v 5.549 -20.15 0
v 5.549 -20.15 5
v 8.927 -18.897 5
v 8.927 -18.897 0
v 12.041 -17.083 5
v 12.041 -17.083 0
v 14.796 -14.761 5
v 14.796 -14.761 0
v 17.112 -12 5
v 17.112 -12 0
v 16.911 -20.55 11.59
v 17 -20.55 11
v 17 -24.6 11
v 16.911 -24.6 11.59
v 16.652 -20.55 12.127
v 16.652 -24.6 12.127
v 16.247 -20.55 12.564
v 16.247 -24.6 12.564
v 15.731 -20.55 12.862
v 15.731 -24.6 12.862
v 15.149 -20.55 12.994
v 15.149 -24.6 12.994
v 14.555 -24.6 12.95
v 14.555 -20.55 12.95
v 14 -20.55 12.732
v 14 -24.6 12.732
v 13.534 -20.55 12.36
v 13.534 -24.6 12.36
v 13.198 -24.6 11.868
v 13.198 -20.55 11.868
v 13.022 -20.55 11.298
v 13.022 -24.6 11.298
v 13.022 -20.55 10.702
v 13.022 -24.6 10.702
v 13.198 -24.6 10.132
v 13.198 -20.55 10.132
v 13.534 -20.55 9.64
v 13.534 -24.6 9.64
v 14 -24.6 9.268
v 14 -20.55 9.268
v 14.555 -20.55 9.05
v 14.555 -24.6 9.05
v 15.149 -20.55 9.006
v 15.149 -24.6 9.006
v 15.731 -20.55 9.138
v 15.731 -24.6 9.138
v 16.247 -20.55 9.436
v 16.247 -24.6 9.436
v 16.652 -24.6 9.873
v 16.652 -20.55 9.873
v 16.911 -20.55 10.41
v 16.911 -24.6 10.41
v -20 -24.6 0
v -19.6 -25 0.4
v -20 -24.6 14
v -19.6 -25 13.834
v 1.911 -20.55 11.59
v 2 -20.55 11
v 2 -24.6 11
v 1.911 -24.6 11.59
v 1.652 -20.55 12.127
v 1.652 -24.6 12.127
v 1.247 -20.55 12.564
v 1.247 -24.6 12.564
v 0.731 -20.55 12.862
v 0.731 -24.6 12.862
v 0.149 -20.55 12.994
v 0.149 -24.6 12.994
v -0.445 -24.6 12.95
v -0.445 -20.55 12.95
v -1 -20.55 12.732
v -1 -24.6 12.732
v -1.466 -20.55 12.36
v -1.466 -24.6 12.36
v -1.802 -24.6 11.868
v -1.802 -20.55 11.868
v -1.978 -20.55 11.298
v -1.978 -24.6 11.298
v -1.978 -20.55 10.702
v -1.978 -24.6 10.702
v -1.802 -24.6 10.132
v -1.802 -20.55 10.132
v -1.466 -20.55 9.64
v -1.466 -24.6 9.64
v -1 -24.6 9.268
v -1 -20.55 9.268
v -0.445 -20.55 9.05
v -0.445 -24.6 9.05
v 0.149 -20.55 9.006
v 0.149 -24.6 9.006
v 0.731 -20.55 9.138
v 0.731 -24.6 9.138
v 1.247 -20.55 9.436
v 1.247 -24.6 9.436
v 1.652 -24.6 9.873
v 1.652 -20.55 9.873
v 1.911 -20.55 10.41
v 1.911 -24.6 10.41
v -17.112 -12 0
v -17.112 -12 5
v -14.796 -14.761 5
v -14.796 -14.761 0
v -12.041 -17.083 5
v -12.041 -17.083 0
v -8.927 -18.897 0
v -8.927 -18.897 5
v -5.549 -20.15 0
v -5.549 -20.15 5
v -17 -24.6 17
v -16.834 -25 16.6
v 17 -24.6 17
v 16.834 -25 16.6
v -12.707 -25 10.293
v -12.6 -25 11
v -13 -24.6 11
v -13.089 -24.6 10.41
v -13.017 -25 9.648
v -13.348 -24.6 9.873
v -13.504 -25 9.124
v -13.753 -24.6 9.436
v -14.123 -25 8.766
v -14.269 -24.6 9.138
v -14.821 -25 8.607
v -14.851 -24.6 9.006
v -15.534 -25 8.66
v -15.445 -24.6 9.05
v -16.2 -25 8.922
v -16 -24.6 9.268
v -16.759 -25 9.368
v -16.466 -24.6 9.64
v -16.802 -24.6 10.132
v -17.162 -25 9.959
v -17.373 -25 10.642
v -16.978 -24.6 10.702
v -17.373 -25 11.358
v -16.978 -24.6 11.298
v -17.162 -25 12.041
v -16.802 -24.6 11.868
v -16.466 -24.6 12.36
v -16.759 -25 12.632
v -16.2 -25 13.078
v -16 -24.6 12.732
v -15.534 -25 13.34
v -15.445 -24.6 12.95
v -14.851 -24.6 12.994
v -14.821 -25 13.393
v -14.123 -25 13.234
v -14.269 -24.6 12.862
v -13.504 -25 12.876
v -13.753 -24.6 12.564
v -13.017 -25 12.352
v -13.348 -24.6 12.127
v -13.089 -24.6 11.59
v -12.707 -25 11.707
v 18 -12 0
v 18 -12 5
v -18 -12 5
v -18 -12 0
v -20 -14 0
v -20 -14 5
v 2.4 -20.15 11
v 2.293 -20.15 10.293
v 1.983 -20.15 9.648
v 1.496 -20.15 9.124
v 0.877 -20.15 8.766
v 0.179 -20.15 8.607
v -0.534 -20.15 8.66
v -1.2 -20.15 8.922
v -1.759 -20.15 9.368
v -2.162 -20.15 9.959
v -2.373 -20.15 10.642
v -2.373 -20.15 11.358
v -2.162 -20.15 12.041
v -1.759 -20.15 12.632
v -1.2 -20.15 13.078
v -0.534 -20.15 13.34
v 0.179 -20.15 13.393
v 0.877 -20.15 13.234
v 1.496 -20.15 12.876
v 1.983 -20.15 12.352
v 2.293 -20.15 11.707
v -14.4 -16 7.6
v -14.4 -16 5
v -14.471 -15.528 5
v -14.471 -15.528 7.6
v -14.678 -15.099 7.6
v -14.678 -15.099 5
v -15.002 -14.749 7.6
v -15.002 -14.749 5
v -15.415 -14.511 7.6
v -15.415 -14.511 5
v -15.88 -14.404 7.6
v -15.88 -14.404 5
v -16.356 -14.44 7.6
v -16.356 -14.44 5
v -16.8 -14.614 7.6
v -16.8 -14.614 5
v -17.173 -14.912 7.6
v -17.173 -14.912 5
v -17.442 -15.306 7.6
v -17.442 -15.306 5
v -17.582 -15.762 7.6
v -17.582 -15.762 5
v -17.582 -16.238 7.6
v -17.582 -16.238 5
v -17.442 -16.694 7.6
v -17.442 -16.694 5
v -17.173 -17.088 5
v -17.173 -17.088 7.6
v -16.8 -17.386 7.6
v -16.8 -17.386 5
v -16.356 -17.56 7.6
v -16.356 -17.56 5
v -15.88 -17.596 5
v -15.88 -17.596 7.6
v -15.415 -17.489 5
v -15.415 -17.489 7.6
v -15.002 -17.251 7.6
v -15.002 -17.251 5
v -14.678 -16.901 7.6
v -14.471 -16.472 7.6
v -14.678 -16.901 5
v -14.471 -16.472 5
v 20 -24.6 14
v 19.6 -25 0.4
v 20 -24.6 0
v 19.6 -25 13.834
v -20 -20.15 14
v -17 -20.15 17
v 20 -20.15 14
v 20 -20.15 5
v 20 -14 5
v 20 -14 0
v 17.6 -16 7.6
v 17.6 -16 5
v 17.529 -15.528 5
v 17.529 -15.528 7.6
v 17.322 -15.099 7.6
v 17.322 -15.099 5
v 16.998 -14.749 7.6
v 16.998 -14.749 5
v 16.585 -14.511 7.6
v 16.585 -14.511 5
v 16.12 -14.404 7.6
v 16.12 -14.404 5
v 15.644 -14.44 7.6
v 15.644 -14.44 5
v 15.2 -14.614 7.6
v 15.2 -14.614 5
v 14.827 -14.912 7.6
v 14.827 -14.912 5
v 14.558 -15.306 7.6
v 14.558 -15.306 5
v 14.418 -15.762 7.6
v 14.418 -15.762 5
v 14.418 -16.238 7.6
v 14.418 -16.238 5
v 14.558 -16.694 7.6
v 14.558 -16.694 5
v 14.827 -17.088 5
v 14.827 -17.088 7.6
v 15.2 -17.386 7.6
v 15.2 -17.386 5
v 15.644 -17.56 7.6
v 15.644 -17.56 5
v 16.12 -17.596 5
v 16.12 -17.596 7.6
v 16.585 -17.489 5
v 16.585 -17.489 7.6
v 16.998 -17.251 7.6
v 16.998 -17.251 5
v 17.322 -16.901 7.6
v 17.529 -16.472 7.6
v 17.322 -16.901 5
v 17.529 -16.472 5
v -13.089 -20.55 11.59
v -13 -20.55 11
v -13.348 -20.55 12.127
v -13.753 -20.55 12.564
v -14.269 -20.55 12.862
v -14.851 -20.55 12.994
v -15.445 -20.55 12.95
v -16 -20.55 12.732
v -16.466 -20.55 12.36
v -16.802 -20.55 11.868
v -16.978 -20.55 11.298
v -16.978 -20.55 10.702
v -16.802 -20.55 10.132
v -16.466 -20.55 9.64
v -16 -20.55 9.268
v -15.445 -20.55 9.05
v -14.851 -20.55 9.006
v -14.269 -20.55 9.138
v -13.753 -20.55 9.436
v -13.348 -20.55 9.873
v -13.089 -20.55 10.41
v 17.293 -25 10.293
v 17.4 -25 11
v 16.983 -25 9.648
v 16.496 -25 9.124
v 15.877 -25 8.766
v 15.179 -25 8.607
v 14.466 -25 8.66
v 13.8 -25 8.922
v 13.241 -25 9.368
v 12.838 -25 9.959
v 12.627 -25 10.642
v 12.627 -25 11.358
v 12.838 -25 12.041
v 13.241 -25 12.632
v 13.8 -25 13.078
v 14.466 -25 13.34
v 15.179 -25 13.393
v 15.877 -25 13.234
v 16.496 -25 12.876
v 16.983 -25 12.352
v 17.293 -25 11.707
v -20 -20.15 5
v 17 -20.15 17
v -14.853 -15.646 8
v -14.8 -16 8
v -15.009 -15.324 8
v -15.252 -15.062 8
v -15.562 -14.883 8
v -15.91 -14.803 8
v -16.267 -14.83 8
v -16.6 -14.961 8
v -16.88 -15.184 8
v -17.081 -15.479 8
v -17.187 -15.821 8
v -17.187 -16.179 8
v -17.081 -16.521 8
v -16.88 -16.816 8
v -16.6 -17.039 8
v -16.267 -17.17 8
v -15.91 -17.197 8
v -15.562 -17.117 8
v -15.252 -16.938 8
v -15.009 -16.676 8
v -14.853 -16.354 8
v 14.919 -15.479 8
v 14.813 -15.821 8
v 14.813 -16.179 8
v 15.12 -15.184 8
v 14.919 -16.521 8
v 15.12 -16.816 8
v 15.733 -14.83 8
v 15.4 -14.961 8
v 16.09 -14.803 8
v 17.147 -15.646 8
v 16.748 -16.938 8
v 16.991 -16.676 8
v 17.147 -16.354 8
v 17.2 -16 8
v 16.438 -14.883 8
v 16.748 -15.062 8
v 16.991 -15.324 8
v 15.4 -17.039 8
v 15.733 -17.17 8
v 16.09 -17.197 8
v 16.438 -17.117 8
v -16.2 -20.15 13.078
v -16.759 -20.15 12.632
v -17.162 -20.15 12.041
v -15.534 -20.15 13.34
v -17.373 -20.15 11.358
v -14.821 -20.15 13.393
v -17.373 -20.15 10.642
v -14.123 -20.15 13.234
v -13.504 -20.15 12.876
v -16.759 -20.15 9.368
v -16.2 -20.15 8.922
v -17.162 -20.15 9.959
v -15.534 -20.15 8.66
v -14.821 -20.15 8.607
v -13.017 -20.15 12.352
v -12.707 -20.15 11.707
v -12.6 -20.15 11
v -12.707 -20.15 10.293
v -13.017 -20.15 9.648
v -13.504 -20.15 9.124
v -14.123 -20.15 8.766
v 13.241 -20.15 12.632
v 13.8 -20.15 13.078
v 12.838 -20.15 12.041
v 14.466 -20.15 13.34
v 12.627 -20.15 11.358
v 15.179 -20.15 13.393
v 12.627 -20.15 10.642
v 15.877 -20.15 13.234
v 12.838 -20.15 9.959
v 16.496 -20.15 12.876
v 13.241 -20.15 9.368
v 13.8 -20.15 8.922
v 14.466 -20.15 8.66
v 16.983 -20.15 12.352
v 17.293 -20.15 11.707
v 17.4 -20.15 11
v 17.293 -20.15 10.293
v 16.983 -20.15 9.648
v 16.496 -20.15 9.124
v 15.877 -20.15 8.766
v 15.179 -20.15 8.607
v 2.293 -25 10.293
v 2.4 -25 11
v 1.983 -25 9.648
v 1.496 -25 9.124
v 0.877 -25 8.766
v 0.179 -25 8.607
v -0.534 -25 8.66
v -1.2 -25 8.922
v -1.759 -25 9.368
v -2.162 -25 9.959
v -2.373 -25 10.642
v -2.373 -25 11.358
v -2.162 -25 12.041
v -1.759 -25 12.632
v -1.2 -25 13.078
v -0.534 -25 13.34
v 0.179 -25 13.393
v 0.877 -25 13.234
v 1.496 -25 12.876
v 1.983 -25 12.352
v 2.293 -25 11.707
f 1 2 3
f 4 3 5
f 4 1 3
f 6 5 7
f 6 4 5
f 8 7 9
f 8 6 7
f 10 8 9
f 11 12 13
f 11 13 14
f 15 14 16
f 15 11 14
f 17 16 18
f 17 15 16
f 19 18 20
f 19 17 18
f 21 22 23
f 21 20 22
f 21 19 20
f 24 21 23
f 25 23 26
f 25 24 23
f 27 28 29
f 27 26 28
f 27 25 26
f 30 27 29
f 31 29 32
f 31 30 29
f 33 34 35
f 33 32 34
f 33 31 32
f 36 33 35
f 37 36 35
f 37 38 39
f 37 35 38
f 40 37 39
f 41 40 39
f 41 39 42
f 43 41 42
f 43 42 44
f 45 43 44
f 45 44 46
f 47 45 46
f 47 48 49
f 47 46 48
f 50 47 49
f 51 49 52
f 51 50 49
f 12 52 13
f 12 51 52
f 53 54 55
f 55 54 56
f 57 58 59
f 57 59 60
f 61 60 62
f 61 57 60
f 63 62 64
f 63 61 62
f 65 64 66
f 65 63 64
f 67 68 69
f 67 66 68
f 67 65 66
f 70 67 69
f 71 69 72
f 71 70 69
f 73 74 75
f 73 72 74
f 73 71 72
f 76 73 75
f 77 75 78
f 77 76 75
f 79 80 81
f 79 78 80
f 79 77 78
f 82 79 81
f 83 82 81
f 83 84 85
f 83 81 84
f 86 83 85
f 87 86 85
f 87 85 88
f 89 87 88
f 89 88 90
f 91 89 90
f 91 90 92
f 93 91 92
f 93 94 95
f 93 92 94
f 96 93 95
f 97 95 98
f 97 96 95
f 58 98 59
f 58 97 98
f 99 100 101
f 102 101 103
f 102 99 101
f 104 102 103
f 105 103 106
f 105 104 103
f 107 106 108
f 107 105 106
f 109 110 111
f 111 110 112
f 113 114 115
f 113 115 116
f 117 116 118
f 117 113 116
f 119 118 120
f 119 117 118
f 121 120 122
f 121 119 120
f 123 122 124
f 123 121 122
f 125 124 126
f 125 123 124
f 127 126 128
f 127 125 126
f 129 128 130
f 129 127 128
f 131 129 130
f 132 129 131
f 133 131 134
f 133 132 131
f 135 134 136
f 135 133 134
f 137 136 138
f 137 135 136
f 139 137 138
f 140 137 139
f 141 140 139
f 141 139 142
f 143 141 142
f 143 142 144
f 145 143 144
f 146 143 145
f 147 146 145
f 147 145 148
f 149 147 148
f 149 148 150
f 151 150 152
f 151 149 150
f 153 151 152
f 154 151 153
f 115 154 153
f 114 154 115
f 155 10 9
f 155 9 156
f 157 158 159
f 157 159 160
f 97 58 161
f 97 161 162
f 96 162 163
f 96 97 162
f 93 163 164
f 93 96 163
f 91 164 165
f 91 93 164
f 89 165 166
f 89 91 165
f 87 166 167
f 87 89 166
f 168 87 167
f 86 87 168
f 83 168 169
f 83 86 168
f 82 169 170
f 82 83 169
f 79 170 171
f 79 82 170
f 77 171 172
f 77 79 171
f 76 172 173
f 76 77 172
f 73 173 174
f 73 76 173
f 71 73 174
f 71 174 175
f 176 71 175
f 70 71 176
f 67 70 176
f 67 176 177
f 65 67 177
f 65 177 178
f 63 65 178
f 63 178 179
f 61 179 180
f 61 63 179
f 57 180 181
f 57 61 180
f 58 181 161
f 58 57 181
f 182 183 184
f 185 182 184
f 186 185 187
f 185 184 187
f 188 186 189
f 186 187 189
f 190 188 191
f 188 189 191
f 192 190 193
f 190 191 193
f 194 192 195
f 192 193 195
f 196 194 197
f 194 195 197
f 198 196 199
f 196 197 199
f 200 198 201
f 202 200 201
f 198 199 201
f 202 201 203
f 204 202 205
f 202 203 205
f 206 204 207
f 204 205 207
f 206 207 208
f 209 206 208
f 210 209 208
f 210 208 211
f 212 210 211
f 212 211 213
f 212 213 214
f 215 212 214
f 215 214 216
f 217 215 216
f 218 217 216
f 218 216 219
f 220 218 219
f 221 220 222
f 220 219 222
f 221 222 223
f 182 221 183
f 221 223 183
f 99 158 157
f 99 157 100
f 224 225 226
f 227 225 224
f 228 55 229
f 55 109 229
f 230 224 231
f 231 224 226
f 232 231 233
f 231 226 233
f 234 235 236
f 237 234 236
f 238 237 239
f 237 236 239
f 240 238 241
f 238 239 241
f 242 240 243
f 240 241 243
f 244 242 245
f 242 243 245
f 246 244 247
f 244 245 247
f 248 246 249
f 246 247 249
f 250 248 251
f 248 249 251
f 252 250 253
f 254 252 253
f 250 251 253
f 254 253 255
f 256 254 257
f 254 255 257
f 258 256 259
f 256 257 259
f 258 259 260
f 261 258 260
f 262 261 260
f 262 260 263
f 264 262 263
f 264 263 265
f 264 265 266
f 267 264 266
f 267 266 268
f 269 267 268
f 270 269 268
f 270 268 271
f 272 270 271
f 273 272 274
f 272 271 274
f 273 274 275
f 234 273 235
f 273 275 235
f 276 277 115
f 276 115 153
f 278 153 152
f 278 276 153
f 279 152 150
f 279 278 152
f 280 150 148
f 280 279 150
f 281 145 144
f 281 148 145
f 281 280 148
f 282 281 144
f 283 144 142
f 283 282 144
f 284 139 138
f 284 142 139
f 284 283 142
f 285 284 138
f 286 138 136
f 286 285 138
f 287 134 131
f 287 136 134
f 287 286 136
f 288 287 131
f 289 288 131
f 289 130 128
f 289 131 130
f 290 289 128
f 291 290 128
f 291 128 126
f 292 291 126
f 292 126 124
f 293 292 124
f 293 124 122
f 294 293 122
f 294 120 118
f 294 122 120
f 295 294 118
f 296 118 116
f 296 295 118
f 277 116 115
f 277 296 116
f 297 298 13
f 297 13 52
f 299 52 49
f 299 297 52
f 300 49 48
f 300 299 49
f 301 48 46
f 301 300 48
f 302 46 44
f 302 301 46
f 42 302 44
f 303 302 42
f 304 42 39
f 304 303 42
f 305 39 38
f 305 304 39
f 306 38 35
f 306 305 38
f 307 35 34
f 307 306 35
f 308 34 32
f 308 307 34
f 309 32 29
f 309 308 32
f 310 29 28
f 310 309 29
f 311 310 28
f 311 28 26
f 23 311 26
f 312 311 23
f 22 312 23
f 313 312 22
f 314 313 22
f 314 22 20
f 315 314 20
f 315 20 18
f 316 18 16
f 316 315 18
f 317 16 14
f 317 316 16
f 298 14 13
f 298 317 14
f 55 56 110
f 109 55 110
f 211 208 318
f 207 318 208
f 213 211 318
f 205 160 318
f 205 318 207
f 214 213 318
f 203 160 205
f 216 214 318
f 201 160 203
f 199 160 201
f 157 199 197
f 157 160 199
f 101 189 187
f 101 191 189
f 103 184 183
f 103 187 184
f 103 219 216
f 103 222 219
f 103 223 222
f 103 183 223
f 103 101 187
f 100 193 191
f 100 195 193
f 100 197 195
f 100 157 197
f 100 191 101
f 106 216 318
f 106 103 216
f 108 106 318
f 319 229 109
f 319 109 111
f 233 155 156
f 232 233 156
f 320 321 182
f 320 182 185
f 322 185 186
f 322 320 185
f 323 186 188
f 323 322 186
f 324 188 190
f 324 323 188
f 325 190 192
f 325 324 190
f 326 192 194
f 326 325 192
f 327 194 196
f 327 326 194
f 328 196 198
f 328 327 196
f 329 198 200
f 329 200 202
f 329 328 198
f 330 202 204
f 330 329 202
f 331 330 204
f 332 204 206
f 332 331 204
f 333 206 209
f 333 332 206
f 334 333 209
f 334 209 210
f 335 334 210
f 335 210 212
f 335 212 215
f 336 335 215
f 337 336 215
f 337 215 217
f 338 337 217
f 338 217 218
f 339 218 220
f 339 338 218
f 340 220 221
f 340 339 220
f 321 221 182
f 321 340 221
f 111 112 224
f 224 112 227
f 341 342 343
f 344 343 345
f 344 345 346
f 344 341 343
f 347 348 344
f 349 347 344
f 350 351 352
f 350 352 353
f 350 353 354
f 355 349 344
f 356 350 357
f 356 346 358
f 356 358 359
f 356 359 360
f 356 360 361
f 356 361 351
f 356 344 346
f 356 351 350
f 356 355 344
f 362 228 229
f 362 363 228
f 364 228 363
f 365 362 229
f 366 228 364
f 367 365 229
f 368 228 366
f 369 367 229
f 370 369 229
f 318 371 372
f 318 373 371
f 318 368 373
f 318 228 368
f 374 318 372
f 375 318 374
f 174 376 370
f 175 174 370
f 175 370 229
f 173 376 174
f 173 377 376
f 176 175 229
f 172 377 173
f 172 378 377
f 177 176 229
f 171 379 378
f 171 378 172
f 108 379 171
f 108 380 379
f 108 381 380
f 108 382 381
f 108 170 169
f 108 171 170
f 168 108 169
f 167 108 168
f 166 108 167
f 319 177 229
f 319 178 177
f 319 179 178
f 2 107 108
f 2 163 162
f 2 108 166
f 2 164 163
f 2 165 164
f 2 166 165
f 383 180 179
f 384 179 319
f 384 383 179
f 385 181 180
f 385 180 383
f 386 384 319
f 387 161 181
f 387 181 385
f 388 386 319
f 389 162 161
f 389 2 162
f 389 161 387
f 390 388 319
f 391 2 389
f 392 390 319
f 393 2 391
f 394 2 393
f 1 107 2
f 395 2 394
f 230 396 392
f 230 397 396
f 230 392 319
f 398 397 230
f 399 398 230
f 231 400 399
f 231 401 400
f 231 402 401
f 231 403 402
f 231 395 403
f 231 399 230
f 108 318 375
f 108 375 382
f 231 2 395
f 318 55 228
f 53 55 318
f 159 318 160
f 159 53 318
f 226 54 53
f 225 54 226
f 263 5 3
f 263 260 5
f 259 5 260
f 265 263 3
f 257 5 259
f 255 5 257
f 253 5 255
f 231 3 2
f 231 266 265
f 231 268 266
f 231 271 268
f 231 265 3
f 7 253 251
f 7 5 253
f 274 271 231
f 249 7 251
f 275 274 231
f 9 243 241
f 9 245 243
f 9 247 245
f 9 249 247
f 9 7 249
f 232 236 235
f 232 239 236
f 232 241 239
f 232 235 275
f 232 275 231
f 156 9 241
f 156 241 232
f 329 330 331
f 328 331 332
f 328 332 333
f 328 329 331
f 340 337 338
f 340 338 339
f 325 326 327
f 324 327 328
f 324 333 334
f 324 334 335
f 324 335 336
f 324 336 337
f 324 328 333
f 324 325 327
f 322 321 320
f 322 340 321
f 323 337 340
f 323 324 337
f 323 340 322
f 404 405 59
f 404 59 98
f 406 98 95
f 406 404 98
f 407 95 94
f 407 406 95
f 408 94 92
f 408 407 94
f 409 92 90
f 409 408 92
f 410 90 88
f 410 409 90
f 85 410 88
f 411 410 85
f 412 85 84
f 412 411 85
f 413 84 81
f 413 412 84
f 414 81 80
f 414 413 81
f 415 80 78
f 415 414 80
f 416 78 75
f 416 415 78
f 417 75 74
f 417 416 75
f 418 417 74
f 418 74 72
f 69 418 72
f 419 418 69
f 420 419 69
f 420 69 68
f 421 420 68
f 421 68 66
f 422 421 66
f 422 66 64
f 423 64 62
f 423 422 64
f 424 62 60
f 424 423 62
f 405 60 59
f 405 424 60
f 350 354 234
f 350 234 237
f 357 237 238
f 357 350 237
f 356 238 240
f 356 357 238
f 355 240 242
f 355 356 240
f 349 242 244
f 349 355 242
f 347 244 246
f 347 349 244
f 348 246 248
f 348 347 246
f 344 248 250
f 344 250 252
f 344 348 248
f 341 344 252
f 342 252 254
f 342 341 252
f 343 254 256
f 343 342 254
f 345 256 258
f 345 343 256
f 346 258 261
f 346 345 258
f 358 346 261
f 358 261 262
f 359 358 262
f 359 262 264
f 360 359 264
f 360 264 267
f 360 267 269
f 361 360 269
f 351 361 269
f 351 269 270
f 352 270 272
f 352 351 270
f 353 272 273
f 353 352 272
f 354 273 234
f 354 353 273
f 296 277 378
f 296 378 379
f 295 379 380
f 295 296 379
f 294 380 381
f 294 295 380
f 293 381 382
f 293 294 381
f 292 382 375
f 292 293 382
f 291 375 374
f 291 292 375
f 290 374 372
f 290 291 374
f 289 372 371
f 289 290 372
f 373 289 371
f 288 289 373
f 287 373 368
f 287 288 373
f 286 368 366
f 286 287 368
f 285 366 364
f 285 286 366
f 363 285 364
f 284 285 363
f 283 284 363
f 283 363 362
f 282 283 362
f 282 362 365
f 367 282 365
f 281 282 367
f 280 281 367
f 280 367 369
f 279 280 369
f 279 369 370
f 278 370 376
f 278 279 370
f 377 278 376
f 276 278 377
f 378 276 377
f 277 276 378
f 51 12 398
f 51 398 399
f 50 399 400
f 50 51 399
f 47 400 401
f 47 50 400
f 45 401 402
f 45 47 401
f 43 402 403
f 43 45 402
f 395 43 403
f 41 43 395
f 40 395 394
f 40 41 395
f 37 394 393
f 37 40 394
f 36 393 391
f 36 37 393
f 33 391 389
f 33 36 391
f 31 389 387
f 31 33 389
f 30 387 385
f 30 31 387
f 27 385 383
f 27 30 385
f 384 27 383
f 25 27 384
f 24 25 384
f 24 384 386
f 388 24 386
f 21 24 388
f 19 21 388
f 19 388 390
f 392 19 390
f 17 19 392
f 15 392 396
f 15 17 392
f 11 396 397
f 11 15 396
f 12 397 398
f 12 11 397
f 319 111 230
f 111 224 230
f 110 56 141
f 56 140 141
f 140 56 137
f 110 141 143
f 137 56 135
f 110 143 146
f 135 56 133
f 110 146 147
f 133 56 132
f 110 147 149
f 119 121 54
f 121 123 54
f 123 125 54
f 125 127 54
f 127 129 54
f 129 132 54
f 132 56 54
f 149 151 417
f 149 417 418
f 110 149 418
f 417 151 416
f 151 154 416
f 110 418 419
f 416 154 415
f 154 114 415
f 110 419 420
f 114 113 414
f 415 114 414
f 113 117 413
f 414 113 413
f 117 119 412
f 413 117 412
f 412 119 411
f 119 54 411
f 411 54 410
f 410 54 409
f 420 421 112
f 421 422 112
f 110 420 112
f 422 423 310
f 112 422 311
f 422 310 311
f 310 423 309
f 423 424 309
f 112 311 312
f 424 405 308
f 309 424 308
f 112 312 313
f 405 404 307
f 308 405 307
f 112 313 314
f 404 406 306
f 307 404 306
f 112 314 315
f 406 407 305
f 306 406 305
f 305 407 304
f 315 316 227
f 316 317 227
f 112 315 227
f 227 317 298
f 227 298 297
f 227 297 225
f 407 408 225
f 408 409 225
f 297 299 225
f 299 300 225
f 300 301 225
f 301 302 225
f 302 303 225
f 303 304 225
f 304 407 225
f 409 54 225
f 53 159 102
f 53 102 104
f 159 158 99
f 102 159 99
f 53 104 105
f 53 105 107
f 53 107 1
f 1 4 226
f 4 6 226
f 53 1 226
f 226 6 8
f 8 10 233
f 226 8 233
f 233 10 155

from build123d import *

# Parameters (mm, degrees)
CYLINDER030_R         = 20.9
CYLINDER030_DEPTH     = 6
BOX007_W              = 40
BOX007_H              = 13
BOX007_DEPTH          = 5
CHAMFER009003002_SIZE = 2
CYLINDER026_R         = 2
CYLINDER026_DEPTH     = 10
CYLINDER029_R         = 2
CYLINDER029_DEPTH     = 10
CYLINDER027_R         = 2
CYLINDER027_DEPTH     = 10
BOX006_W              = 40
BOX006_H              = 4.85
BOX006_DEPTH          = 17
CHAMFER009003006_SIZE = 3
CYLINDER033_R         = 1.6
CYLINDER033_DEPTH     = 3
CYLINDER031_R         = 1.6
CYLINDER031_DEPTH     = 3
CHAMFER009003005_SIZE = 0.4
CHAMFER009003007_SIZE = 0.4


with BuildPart() as cylinder030:
    # Cylinder030 → Cylinder030 (new body)
    with BuildSketch(Plane.XY):
        Circle(CYLINDER030_R)
    extrude(amount=CYLINDER030_DEPTH)


with BuildPart() as cut004003006006002:
    # Box007 → Box007 (new body)
    with BuildSketch(Plane(origin=(-20, -25, 0), x_dir=(1, 0, 0), z_dir=(0, 0, 1))):
        with Locations((20, 6.5)):
            Rectangle(BOX007_W, BOX007_H)
    extrude(amount=BOX007_DEPTH)

    # Chamfer009003002
    chamfer009003002_edges = [cut004003006006002.edges().sort_by_distance(p)[0] for p in [
        (-20, -12, 2.5),
        (20, -12, 2.5),
    ]]
    chamfer(chamfer009003002_edges, length=CHAMFER009003002_SIZE)

    # Cut004003006006002: cut Cylinder030
    add(cylinder030.part, mode=Mode.SUBTRACT)


with BuildPart() as cylinder026:
    # Cylinder026 → Cylinder026 (new body)
    with BuildSketch(Plane(origin=(0, -20, 11), x_dir=(1, 0, 0), z_dir=(0, -1, 0))):
        Circle(CYLINDER026_R)
    extrude(amount=CYLINDER026_DEPTH)


with BuildPart() as cylinder029:
    # Cylinder029 → Cylinder029 (new body)
    with BuildSketch(Plane(origin=(15, -20, 11), x_dir=(1, 0, 0), z_dir=(0, -1, 0))):
        Circle(CYLINDER029_R)
    extrude(amount=CYLINDER029_DEPTH)


with BuildPart() as fusion001028:
    # Cylinder027 → Cylinder027 (new body)
    with BuildSketch(Plane(origin=(-15, -20, 11), x_dir=(1, 0, 0), z_dir=(0, -1, 0))):
        Circle(CYLINDER027_R)
    extrude(amount=CYLINDER027_DEPTH)

    # Fusion001028: union Cylinder026, Cylinder029
    add(cylinder026.part)
    add(cylinder029.part)


with BuildPart() as chamfer009003006:
    # Box006 → Box006 (new body)
    with BuildSketch(Plane(origin=(-20, -25, 0), x_dir=(1, 0, 0), z_dir=(0, 0, 1))):
        with Locations((20, 2.425)):
            Rectangle(BOX006_W, BOX006_H)
    extrude(amount=BOX006_DEPTH)

    # Cut004003006006003: cut Fusion001028
    add(fusion001028.part, mode=Mode.SUBTRACT)

    # Chamfer009003006
    chamfer009003006_edges = [chamfer009003006.edges().sort_by_distance(p)[0] for p in [
        (-20, -22.575, 17),
        (20, -22.575, 17),
    ]]
    chamfer(chamfer009003006_edges, length=CHAMFER009003006_SIZE)


with BuildPart() as cylinder033:
    # Cylinder033 → Cylinder033 (new body)
    with BuildSketch(Plane(origin=(16, -16, 5), x_dir=(1, 0, 0), z_dir=(0, 0, 1))):
        Circle(CYLINDER033_R)
    extrude(amount=CYLINDER033_DEPTH)


with BuildPart() as chamfer009003007:
    # Cylinder031 → Cylinder031 (new body)
    with BuildSketch(Plane(origin=(-16, -16, 5), x_dir=(1, 0, 0), z_dir=(0, 0, 1))):
        Circle(CYLINDER031_R)
    extrude(amount=CYLINDER031_DEPTH)

    # Fusion001027: union Cylinder033
    add(cylinder033.part)

    # Chamfer009003005
    chamfer009003005_edges = [chamfer009003007.edges().sort_by_distance(p)[0] for p in [
        (-17.6, -16, 8),
        (14.4, -16, 8),
    ]]
    chamfer(chamfer009003005_edges, length=CHAMFER009003005_SIZE)

    # Fusion001029: union Cut004003006006002, Chamfer009003006
    add(cut004003006006002.part)
    add(chamfer009003006.part)

    # Chamfer009003007
    chamfer009003007_edges = [chamfer009003007.edges().sort_by_distance(p)[0] for p in [
        (-18.5, -25, 15.5),
        (-17, -20.15, 11),
        (-2, -20.15, 11),
        (13, -20.15, 11),
        (18.5, -25, 15.5),
        (0, -25, 17),
        (-17, -25, 11),
        (-2, -25, 11),
        (13, -25, 11),
        (-20, -25, 7),
        (0, -25, 0),
        (20, -25, 7),
    ]]
    chamfer(chamfer009003007_edges, length=CHAMFER009003007_SIZE)


solid = chamfer009003007.part
